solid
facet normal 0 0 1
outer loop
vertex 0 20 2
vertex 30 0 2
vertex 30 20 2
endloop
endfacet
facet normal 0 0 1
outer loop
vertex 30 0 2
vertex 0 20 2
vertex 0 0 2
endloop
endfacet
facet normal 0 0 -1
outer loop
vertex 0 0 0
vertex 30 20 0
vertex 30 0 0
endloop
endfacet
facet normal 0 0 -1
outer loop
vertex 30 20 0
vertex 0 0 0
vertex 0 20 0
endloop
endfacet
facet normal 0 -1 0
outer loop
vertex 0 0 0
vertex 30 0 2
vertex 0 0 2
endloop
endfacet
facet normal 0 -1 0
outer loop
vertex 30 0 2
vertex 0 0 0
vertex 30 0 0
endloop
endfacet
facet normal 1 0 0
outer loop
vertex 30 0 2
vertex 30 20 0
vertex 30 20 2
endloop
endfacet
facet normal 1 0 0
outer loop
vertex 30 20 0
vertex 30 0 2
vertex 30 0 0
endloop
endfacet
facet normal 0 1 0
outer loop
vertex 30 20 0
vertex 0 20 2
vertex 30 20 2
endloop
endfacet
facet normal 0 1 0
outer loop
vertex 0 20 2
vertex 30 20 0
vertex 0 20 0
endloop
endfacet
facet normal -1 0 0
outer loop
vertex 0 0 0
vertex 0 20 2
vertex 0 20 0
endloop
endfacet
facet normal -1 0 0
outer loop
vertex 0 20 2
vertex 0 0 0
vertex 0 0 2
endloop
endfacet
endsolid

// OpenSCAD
union() {
	color(c = [0.4000000000, 0.4000000000, 0.4000000000]) {
		cube(size = [30, 20, 2]);
	}
	union() {
		color(c = [0, 0, 0]) {
			translate(v = [30, 20, -3]) {
				rotate(a = [90, 90, 0]) {
					union() {
						translate(v = [0, 0, 4]) {
							union() {
								difference() {
									difference() {
										circle(r = 5);
										rotate(a = 0) {
											translate(v = [0, -5, 0]) {
												square(center = true, size = [15, 10]);
											}
										}
										rotate(a = 0) {
											translate(v = [0, -5, 0]) {
												square(center = true, size = [15, 10]);
											}
										}
									}
									difference() {
										circle(r = 4);
										rotate(a = 0) {
											translate(v = [0, -4, 0]) {
												square(center = true, size = [12, 8]);
											}
										}
										rotate(a = 0) {
											translate(v = [0, -4, 0]) {
												square(center = true, size = [12, 8]);
											}
										}
									}
								}
								union() {
									translate(v = [0, 0, 6]) {
										difference() {
											difference() {
												circle(r = 5);
												rotate(a = 0) {
													translate(v = [0, -5, 0]) {
														square(center = true, size = [15, 10]);
													}
												}
												rotate(a = 0) {
													translate(v = [0, -5, 0]) {
														square(center = true, size = [15, 10]);
													}
												}
											}
											difference() {
												circle(r = 4);
												rotate(a = 0) {
													translate(v = [0, -4, 0]) {
														square(center = true, size = [12, 8]);
													}
												}
												rotate(a = 0) {
													translate(v = [0, -4, 0]) {
														square(center = true, size = [12, 8]);
													}
												}
											}
										}
									}
									translate(v = [0, 0, 6]) {
										translate(v = [0, 0, 6]) {
											difference() {
												difference() {
													circle(r = 5);
													rotate(a = 0) {
														translate(v = [0, -5, 0]) {
															square(center = true, size = [15, 10]);
														}
													}
													rotate(a = 0) {
														translate(v = [0, -5, 0]) {
															square(center = true, size = [15, 10]);
														}
													}
												}
												difference() {
													circle(r = 4);
													rotate(a = 0) {
														translate(v = [0, -4, 0]) {
															square(center = true, size = [12, 8]);
														}
													}
													rotate(a = 0) {
														translate(v = [0, -4, 0]) {
															square(center = true, size = [12, 8]);
														}
													}
												}
											}
										}
									}
								}
							}
						}
						translate(v = [1, -0.5000000000, 0]) {
							cube(size = [4, 1, 20]);
						}
					}
				}
			}
		}
		color(c = [0, 0, 0.8000000000]) {
			translate(v = [5, 0, -18]) {
				rotate(a = [-90, -90, 0]) {
					translate(v = [0, 0, 5]) {
						union() {
							union() {
								difference() {
									difference() {
										circle(r = 20);
										rotate(a = 0) {
											translate(v = [0, -20, 0]) {
												square(center = true, size = [60, 40]);
											}
										}
										rotate(a = -90) {
											translate(v = [0, -20, 0]) {
												square(center = true, size = [60, 40]);
											}
										}
									}
									difference() {
										circle(r = 17);
										rotate(a = 0) {
											translate(v = [0, -17, 0]) {
												square(center = true, size = [51, 34]);
											}
										}
										rotate(a = 0) {
											translate(v = [0, -17, 0]) {
												square(center = true, size = [51, 34]);
											}
										}
									}
								}
								translate(v = [0, 18, -1.5000000000]) {
									cube(size = [20, 2, 3]);
								}
							}
							translate(v = [0, 0, 10]) {
								union() {
									difference() {
										difference() {
											circle(r = 20);
											rotate(a = 0) {
												translate(v = [0, -20, 0]) {
													square(center = true, size = [60, 40]);
												}
											}
											rotate(a = -90) {
												translate(v = [0, -20, 0]) {
													square(center = true, size = [60, 40]);
												}
											}
										}
										difference() {
											circle(r = 17);
											rotate(a = 0) {
												translate(v = [0, -17, 0]) {
													square(center = true, size = [51, 34]);
												}
											}
											rotate(a = 0) {
												translate(v = [0, -17, 0]) {
													square(center = true, size = [51, 34]);
												}
											}
										}
									}
									translate(v = [0, 18, -1.5000000000]) {
										cube(size = [20, 2, 3]);
									}
								}
							}
						}
					}
				}
			}
		}
	}
}
